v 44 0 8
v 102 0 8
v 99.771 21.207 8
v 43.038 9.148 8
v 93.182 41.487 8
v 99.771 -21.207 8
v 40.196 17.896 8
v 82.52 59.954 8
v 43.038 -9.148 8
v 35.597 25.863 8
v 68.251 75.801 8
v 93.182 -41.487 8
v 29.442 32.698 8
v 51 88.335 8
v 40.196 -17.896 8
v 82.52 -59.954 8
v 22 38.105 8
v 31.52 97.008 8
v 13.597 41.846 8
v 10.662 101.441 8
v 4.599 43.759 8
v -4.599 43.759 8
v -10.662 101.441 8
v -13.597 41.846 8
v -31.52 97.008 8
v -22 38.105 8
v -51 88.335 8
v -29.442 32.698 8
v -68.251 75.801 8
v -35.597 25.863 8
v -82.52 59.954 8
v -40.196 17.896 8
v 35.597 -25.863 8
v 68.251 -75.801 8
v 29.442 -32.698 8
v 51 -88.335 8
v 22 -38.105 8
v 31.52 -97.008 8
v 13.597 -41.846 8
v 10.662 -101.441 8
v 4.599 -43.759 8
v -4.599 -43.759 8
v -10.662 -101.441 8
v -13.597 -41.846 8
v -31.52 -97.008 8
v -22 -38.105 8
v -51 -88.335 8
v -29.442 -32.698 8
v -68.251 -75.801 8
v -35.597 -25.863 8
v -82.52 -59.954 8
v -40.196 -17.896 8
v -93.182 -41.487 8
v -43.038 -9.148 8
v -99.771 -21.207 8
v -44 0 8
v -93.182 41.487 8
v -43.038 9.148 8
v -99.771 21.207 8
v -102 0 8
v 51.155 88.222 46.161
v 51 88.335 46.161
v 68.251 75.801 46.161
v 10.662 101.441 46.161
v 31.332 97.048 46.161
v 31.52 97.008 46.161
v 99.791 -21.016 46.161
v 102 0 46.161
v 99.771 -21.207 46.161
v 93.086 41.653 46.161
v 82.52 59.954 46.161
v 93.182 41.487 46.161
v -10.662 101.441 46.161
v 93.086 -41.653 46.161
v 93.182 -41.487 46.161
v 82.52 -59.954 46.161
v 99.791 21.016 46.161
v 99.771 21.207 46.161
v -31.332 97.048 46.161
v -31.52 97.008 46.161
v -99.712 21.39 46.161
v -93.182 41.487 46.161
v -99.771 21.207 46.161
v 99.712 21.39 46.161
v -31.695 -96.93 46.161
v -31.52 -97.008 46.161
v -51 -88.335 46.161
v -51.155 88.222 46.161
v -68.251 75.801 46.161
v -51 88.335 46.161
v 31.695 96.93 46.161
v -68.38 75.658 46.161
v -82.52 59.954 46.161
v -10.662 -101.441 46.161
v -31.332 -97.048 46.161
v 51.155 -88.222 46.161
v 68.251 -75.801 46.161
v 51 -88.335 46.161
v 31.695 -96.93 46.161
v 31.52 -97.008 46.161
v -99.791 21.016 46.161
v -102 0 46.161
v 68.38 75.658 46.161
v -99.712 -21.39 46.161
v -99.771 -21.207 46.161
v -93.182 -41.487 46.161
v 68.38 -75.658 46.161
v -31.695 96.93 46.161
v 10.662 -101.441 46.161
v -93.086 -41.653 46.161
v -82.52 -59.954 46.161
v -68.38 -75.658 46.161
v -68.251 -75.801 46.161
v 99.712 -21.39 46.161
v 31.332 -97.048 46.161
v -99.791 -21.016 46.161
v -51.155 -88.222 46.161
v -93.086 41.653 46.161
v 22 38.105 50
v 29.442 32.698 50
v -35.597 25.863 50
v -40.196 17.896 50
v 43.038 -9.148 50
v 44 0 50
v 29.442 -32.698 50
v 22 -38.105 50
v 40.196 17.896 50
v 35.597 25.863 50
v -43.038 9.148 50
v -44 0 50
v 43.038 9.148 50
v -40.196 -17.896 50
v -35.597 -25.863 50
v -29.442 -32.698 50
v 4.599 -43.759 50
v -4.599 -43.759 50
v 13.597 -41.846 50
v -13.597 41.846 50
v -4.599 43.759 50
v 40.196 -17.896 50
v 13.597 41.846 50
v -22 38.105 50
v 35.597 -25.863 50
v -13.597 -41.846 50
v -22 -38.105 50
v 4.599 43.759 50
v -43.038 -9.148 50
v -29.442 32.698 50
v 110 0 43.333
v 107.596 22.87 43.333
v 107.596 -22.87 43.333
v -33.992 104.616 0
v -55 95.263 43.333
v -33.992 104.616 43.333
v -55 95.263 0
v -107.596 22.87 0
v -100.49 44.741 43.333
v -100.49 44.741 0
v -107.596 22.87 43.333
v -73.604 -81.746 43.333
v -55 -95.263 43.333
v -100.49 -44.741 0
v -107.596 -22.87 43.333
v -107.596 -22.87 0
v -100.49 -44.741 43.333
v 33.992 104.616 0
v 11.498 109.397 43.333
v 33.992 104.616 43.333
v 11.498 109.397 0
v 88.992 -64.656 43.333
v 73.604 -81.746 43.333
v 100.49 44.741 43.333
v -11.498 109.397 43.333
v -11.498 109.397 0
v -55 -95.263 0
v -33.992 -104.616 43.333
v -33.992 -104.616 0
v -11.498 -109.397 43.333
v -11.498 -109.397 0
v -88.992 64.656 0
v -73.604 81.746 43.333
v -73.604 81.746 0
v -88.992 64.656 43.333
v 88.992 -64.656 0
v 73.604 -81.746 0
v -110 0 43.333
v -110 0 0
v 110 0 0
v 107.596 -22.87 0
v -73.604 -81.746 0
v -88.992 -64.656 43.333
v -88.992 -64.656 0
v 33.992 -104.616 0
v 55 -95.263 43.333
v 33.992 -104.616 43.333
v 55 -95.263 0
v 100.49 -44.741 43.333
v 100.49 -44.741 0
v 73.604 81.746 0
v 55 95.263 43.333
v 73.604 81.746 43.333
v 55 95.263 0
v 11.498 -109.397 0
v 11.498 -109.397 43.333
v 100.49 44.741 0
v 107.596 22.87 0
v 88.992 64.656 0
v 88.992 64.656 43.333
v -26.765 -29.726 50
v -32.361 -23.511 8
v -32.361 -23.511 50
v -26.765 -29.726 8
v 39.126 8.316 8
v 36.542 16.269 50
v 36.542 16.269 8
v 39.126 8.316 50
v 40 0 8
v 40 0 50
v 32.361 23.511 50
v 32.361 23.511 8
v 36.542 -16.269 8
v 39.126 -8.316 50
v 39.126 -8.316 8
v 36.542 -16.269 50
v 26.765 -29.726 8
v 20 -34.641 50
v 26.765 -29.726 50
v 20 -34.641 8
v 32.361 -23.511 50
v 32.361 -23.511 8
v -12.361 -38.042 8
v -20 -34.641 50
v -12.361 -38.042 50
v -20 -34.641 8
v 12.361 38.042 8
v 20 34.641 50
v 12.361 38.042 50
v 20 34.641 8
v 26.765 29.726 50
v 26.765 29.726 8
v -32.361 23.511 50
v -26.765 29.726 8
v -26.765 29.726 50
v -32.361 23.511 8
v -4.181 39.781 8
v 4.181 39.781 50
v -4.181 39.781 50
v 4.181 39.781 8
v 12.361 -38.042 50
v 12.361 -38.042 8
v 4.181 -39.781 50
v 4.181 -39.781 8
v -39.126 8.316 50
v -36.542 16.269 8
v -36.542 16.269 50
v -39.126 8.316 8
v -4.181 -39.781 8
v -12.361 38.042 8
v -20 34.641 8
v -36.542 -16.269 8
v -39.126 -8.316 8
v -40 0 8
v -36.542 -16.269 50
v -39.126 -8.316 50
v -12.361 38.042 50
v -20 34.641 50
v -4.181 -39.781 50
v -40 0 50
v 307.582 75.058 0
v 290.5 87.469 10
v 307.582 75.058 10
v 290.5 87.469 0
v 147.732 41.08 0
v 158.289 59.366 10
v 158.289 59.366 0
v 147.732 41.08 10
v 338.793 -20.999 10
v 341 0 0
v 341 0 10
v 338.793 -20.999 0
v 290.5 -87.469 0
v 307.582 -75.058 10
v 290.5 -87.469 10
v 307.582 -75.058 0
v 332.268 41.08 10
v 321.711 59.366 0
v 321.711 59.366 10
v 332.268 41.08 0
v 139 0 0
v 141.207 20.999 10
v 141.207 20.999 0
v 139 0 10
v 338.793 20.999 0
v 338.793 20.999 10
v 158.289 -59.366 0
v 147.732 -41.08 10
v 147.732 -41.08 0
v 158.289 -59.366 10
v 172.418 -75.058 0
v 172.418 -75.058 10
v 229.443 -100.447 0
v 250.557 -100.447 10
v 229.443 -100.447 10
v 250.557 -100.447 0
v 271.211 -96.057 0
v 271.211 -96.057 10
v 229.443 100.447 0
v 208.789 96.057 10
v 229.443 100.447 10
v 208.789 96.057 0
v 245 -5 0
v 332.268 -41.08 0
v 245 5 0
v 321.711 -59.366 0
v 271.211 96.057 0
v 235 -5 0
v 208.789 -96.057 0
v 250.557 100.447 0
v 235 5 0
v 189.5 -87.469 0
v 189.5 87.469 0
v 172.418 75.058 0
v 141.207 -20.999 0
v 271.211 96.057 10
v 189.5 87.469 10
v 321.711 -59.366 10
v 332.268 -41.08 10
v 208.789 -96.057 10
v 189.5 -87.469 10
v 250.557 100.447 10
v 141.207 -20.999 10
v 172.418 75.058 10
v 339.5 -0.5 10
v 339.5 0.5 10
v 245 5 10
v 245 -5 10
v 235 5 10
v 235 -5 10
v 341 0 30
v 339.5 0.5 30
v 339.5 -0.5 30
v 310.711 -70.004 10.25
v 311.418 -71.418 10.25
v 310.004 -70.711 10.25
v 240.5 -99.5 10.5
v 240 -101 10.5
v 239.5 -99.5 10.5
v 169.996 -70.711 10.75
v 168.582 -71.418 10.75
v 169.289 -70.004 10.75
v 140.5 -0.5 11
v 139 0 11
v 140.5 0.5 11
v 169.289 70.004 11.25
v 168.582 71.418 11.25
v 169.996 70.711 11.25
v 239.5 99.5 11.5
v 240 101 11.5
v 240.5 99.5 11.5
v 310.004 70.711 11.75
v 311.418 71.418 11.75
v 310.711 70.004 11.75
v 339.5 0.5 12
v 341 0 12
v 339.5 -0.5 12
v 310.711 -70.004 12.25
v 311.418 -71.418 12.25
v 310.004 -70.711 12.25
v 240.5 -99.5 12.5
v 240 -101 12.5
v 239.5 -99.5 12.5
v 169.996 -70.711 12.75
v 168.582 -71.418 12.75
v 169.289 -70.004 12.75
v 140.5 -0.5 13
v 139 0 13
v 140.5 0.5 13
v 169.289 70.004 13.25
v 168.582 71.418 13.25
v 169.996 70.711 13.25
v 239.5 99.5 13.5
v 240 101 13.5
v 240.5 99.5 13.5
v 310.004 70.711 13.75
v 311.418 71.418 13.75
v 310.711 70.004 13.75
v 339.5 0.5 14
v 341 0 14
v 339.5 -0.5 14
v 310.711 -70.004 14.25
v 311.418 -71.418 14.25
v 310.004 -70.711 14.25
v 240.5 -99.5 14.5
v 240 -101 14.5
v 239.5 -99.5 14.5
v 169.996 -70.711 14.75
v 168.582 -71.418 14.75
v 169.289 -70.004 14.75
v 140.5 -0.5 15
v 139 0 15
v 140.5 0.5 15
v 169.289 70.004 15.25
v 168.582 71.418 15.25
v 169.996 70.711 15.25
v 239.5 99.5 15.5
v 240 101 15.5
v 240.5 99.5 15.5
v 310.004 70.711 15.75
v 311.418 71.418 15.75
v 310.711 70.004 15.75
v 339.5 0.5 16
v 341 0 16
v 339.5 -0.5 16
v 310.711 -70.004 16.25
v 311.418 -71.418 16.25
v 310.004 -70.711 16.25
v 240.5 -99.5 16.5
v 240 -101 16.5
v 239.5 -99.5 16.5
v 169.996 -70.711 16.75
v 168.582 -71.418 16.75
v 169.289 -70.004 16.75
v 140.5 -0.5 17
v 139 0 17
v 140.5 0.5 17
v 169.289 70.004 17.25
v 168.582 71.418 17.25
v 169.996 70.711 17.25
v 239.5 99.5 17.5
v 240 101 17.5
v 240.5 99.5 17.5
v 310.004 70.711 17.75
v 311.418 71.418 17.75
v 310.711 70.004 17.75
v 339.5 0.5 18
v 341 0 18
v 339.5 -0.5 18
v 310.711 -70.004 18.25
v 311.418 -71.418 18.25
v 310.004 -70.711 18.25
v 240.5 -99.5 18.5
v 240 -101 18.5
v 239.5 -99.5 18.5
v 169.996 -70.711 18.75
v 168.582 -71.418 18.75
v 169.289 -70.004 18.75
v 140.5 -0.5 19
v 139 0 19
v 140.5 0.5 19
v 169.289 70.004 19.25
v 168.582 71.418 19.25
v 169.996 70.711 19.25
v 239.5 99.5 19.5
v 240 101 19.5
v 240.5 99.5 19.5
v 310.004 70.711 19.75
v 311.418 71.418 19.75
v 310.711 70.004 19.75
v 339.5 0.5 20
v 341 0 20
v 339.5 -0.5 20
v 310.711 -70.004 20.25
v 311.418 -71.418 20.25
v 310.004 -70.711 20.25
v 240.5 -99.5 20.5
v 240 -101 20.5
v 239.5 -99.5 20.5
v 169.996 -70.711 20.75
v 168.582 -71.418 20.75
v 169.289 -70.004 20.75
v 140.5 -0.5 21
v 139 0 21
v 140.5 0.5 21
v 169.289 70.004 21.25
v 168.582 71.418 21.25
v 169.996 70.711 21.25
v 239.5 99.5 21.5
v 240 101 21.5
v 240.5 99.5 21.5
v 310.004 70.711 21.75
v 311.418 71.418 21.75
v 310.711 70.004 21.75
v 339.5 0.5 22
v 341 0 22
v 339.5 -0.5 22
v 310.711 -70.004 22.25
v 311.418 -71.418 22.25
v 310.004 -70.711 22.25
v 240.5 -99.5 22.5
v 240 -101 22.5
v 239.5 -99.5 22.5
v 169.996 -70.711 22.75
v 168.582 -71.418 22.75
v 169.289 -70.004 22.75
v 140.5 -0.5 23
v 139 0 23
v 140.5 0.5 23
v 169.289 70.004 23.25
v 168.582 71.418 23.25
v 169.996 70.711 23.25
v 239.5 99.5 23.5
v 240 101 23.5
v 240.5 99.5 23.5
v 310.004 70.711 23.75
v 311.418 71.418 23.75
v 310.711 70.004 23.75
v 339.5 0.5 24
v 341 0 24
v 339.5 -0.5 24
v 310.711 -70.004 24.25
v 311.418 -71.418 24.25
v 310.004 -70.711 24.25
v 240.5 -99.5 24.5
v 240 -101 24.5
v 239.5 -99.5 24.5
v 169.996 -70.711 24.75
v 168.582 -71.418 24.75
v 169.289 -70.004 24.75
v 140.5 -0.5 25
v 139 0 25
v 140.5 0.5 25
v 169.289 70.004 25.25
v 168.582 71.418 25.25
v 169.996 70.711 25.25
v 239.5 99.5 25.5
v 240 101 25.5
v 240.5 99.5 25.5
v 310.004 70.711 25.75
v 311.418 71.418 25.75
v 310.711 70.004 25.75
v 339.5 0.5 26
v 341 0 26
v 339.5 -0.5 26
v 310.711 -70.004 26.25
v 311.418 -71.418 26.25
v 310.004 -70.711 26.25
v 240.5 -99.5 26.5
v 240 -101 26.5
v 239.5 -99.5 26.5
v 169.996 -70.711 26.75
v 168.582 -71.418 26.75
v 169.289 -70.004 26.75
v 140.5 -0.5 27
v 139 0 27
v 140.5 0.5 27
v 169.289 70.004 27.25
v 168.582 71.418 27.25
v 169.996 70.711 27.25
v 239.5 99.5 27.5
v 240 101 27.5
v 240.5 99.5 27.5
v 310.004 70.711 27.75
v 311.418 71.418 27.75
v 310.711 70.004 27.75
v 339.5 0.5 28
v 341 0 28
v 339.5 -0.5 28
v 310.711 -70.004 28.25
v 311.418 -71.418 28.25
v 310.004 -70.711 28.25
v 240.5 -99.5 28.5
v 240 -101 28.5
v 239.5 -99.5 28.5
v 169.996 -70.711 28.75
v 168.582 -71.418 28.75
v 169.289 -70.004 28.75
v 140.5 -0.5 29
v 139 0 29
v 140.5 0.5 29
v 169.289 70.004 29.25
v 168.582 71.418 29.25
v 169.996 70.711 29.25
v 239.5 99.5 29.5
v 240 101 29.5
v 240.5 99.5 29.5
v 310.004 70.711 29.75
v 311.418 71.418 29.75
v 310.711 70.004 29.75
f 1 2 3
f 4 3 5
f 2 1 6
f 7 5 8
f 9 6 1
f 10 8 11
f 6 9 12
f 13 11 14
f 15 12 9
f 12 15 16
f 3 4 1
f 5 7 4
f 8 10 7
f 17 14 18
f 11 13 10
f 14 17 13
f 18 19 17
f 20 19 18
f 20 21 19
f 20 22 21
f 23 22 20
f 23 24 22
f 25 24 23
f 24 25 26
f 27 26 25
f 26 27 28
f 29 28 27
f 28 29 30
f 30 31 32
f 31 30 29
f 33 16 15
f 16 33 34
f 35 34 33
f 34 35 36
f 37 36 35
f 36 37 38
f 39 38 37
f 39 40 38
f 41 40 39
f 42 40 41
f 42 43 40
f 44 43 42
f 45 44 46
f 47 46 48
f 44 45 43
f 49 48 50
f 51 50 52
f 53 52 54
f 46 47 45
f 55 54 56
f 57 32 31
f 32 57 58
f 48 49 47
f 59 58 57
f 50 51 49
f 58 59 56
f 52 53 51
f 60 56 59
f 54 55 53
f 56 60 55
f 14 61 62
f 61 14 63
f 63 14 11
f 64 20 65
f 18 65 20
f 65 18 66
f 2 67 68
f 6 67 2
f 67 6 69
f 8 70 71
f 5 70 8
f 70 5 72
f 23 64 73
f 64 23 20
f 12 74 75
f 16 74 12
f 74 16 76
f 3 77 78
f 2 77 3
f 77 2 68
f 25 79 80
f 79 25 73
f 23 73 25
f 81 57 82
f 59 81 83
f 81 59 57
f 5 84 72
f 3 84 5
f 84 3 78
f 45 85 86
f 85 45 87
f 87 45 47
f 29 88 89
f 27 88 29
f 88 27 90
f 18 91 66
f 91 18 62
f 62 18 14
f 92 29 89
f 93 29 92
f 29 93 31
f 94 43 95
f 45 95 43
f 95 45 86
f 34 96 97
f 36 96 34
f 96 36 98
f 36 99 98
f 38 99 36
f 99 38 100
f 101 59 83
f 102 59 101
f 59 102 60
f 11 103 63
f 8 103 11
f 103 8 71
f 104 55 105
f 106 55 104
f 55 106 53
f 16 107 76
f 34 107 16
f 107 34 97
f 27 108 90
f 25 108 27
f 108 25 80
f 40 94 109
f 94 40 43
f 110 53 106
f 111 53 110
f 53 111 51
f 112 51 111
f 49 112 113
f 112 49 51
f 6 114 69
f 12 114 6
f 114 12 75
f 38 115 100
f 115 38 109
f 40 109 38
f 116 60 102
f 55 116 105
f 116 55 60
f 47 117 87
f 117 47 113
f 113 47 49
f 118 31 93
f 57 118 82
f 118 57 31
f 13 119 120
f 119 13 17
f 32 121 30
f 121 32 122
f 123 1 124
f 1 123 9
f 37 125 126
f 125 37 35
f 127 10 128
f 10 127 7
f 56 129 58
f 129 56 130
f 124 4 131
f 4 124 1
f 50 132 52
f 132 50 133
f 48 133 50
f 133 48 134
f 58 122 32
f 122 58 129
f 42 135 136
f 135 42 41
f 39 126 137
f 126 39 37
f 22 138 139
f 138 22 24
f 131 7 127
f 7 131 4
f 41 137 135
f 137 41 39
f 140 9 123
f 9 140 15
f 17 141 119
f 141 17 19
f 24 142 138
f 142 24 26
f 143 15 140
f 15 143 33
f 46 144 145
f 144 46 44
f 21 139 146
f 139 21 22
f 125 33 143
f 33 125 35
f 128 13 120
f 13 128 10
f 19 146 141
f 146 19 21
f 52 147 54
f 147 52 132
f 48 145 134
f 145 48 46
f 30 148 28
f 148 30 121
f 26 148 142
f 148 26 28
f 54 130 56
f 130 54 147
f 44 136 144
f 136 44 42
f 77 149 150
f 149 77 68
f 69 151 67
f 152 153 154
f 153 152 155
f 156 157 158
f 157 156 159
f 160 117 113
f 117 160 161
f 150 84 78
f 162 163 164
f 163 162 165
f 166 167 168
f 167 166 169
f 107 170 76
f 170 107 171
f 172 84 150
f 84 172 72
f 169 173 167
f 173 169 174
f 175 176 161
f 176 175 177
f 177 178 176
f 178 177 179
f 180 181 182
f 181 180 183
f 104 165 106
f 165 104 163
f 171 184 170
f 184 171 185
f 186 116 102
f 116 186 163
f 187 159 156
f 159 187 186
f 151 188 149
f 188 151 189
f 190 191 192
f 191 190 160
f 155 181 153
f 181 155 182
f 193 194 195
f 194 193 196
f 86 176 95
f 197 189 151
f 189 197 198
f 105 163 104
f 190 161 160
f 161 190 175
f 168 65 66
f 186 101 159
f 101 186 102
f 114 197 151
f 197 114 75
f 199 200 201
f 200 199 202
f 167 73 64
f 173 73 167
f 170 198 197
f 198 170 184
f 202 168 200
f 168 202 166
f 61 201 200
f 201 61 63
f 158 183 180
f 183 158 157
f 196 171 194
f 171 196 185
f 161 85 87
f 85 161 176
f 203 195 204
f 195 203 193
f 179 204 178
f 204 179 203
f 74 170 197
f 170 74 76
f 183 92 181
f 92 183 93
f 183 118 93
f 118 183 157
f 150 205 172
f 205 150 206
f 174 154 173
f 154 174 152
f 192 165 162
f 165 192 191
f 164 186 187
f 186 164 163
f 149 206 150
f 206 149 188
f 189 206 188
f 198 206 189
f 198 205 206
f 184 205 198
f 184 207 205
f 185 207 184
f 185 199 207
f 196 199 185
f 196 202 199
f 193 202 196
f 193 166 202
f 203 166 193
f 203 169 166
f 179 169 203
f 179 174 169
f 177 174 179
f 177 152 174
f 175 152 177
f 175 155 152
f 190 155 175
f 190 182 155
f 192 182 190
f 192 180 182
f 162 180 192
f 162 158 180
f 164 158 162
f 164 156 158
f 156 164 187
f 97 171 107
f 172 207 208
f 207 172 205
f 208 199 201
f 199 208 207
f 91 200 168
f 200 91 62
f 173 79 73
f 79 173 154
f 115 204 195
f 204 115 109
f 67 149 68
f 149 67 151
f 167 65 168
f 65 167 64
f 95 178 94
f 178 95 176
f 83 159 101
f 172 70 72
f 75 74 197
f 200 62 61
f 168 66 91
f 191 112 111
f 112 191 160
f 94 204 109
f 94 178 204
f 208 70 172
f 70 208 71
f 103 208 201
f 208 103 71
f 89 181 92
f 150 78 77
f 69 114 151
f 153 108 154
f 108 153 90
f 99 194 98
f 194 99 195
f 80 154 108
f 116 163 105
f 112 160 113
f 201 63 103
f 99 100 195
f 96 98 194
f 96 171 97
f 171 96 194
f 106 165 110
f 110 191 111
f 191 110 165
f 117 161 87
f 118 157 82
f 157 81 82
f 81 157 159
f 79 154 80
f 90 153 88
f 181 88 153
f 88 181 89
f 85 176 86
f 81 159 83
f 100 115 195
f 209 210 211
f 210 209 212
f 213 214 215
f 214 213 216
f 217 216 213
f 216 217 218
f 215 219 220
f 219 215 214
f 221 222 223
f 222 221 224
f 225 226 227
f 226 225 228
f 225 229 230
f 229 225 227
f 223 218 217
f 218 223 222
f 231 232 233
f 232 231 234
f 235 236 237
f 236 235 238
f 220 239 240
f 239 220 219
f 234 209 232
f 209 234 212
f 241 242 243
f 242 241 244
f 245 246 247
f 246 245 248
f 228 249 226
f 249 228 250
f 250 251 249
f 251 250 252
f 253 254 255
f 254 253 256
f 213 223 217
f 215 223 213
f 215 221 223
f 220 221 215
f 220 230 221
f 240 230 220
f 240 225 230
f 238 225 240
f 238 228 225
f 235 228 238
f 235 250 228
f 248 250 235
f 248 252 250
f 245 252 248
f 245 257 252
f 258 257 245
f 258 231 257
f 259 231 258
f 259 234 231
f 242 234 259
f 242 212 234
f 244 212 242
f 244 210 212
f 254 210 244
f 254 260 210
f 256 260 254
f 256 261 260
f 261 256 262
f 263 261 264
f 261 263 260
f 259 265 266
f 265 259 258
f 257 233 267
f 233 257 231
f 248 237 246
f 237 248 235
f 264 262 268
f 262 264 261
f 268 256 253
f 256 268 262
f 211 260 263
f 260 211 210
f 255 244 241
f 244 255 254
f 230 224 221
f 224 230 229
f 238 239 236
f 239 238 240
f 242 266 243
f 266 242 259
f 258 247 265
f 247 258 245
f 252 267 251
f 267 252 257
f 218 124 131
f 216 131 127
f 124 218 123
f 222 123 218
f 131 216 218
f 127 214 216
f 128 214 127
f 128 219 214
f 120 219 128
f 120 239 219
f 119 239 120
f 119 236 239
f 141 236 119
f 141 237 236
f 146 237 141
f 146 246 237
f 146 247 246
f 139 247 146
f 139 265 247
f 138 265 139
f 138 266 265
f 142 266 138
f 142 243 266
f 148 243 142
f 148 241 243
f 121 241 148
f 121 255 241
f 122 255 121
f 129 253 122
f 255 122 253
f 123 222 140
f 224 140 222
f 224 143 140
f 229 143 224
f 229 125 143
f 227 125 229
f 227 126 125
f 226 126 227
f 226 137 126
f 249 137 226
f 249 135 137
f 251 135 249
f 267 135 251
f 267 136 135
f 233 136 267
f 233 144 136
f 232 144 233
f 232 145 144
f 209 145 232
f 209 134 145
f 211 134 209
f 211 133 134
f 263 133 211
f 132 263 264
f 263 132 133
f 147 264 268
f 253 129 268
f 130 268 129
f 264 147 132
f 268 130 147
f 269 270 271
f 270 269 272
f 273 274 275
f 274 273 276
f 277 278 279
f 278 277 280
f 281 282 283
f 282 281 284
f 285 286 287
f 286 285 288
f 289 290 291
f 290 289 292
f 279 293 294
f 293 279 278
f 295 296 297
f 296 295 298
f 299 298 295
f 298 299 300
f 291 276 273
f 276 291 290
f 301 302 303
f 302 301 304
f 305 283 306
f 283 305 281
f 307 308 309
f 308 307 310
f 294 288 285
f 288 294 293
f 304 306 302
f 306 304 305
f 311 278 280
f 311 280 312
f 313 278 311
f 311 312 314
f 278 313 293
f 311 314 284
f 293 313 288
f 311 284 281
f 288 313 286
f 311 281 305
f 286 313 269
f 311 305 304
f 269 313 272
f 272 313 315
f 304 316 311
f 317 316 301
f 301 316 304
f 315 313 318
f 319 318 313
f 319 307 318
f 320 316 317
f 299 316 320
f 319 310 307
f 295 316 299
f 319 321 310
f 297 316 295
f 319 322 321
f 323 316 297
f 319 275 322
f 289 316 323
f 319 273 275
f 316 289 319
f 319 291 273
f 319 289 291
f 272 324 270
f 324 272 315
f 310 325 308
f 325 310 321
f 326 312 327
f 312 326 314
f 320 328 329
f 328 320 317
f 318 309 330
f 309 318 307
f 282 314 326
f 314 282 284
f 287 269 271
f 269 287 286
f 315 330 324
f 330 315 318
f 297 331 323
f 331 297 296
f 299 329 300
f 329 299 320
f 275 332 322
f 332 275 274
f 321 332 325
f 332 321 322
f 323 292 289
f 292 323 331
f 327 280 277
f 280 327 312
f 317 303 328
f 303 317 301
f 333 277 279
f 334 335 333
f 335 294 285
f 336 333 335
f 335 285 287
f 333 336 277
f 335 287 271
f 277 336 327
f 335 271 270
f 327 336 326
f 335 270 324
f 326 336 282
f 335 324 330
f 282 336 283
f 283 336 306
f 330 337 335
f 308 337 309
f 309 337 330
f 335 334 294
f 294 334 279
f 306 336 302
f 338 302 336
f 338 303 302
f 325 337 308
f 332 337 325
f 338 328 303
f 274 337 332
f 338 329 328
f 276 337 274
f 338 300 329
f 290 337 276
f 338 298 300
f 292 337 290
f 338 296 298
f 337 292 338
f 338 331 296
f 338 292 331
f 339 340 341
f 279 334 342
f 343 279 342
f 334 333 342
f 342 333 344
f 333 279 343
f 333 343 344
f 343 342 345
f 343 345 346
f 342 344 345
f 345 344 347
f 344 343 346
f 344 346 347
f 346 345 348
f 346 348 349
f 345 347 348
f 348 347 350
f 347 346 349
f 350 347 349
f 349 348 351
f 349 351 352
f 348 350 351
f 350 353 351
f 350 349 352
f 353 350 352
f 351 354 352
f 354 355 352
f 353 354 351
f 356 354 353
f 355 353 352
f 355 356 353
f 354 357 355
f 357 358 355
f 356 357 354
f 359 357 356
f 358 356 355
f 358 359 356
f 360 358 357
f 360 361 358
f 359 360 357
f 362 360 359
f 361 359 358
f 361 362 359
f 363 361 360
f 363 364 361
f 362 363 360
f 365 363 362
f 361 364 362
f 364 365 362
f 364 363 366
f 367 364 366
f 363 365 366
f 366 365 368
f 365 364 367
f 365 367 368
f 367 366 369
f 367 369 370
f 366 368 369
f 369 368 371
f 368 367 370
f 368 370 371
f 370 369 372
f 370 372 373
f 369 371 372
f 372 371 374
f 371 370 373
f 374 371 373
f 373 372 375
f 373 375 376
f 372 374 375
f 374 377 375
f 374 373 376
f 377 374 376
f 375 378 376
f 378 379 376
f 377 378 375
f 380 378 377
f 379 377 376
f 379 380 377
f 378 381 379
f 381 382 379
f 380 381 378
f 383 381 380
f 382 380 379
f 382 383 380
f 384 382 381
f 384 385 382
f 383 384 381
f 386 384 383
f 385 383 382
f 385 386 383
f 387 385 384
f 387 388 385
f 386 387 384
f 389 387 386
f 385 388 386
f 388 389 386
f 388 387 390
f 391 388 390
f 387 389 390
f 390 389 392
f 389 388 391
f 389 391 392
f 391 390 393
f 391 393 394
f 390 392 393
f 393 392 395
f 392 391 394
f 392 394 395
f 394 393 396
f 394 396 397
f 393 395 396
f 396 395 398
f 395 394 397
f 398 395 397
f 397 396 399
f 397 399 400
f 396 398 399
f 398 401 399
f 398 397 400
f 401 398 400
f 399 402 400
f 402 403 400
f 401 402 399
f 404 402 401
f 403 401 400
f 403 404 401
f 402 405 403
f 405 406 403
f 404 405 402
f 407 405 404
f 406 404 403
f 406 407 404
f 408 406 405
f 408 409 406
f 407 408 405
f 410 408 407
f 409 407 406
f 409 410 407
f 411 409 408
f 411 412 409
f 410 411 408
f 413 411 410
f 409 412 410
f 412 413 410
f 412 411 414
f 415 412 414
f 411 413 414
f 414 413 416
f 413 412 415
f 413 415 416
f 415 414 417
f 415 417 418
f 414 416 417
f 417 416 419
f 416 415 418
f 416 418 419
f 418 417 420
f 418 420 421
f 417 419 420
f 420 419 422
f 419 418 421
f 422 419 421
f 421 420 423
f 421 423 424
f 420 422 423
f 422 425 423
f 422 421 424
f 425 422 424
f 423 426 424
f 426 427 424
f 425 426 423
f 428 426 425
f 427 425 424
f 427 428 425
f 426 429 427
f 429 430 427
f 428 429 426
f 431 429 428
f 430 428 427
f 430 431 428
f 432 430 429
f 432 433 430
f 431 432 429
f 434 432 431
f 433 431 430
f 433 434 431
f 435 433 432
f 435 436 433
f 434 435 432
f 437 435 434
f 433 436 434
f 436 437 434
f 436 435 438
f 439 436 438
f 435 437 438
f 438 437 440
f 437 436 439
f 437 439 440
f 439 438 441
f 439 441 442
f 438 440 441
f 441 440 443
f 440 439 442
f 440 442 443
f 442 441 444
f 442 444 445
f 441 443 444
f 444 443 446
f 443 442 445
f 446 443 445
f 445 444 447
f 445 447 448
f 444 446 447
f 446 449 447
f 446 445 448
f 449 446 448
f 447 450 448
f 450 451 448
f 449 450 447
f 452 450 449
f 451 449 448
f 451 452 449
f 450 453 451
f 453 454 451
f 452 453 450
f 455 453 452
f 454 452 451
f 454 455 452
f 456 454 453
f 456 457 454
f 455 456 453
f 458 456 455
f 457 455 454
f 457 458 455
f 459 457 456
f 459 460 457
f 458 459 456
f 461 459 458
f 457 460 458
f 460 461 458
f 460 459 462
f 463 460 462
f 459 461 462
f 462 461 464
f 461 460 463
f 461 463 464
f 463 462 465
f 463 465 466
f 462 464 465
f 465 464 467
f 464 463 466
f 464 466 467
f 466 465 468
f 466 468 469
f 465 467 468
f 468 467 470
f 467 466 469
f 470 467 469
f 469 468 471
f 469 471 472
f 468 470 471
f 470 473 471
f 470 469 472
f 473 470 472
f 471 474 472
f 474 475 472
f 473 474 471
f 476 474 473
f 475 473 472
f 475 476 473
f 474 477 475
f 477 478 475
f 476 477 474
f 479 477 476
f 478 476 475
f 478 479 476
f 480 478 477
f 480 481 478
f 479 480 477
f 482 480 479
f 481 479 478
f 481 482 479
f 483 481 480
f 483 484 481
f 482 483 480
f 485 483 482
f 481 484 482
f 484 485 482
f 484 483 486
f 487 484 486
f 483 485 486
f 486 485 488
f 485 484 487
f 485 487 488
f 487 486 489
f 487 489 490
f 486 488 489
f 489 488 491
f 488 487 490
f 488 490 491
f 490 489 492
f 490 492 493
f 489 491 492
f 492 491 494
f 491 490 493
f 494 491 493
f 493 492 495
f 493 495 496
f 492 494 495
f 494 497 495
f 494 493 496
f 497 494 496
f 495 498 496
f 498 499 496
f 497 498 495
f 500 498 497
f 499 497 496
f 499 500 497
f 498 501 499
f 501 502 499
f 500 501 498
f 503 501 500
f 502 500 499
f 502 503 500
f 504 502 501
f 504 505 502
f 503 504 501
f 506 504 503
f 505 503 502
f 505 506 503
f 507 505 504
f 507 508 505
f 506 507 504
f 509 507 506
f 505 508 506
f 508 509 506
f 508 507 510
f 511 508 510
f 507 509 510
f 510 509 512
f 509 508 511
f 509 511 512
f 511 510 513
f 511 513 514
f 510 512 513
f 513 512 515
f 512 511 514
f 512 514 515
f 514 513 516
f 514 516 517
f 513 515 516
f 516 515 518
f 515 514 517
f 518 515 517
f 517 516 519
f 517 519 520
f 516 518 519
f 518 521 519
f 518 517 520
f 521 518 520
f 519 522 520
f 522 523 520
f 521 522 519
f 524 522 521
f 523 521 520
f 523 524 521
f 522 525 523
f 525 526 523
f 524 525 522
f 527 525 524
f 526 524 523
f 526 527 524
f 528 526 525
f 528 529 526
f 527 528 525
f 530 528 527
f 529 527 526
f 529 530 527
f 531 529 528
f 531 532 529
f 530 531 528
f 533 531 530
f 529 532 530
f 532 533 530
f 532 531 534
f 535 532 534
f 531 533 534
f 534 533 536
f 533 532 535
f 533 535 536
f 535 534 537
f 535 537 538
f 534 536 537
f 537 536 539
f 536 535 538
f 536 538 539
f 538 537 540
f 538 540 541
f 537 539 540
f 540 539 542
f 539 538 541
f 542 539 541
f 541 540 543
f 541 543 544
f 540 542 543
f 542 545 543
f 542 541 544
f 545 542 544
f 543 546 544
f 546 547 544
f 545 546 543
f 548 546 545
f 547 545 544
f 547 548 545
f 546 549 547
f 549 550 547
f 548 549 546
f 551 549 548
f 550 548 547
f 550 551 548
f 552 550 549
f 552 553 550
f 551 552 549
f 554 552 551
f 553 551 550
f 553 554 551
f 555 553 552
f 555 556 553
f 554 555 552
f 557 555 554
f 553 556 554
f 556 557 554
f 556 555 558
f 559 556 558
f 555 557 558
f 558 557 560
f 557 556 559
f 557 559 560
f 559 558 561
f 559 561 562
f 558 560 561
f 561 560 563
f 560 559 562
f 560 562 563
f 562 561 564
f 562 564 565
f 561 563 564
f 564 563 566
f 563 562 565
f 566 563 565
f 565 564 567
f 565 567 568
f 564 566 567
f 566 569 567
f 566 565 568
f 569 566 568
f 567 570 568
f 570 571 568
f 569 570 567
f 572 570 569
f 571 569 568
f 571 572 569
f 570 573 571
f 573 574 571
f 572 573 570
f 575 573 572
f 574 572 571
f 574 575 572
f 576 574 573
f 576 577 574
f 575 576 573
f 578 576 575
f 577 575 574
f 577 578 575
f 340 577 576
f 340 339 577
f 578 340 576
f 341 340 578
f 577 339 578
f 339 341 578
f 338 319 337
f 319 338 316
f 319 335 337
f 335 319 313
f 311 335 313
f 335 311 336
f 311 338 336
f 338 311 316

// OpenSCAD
// Lamp Stand Design with Threaded Cover and Compartments
// Circular base with threaded top, electronics compartment, and sand chamber
// By GitHub Copilot

// Parameters
base_diameter = 220;        // Base diameter in mm
base_height = 80;           // Height of the lamp stand
wall_thickness = 8;         // Wall thickness for hollow interior
tube_hole_size = 10;        // 10x10mm square hole for aluminum tube
tube_hole_depth = 40;       // How deep the tube hole goes

// Thread parameters (metric M200x2)
thread_pitch = 2;           // Metric thread pitch
thread_depth = 1.5;         // Thread depth
thread_height = 20;         // Height of threaded section
cover_thickness = 10;       // Thickness of removable cover

// Electronics compartment
electronics_radius = 40;    // Radius of central electronics compartment
divider_thickness = 4;      // Thickness of wall between compartments

// Calculated values
base_radius = base_diameter / 2;
outer_sand_inner_radius = electronics_radius + divider_thickness;
outer_sand_outer_radius = base_radius - wall_thickness;

// Simple thread approximation module
module metric_thread_external(radius, pitch, height) {
    linear_extrude(height = height, twist = 360 * height / pitch, slices = height * 4)
        polygon([
            [radius - thread_depth, -pitch/4],
            [radius, 0],
            [radius - thread_depth, pitch/4]
        ]);
}

module metric_thread_internal(radius, pitch, height) {
    linear_extrude(height = height, twist = -360 * height / pitch, slices = height * 4)
        polygon([
            [radius, -pitch/4],
            [radius + thread_depth, 0],
            [radius, pitch/4]
        ]);
}

module lamp_stand_base() {
    difference() {
        // Main body with rounded top
        hull() {
            // Bottom cylinder (flat)
            cylinder(h = base_height - base_radius/3, r = base_radius);
            
            // Top sphere section for rounded appearance
            translate([0, 0, base_height - base_radius/3])
                sphere(r = base_radius/3);
        }
        
        // Central electronics compartment
        translate([0, 0, wall_thickness])
            cylinder(h = base_height - cover_thickness - wall_thickness, r = electronics_radius);
        
        // Outer sand compartment (ring around electronics)
        translate([0, 0, wall_thickness])
            difference() {
                cylinder(h = base_height - cover_thickness - wall_thickness, r = outer_sand_outer_radius);
                cylinder(h = base_height - cover_thickness - wall_thickness + 1, r = outer_sand_inner_radius);
            }
        
        // Threaded cavity for cover (inside the base)
        translate([0, 0, base_height - cover_thickness - thread_height])
            cylinder(h = cover_thickness + thread_height + 1, r = base_radius - wall_thickness);
        
        // Internal female threads (inside the cavity)
        translate([0, 0, base_height - cover_thickness - thread_height])
            metric_thread_internal(base_radius - wall_thickness - 1, thread_pitch, thread_height);
        
        // Square hole for 10x10mm aluminum tube - goes down from top only
        translate([0, 0, base_height - tube_hole_depth])
            linear_extrude(height = tube_hole_depth + 1)
                square([tube_hole_size, tube_hole_size], center = true);
    }
}

module lamp_stand_cover() {
    translate([base_diameter + 20, 0, 0]) {
        difference() {
            union() {
                // Cover body - sits flush with base top
                cylinder(h = cover_thickness, r = base_radius - wall_thickness - 1);
                
                // External male threads that screw into the base cavity
                translate([0, 0, cover_thickness])
                    metric_thread_external(base_radius - wall_thickness - 1, thread_pitch, thread_height);
            }
            
            // Tube hole through cover
            translate([0, 0, -1])
                linear_extrude(height = cover_thickness + thread_height + 2)
                    square([tube_hole_size, tube_hole_size], center = true);
        }
    }
}

// Render both parts
lamp_stand_base();
lamp_stand_cover();

// Optional: Show a preview of the aluminum tube
%translate([0, 0, base_height - tube_hole_depth/2])
    linear_extrude(height = tube_hole_depth + 20)
        square([tube_hole_size - 0.2, tube_hole_size - 0.2], center = true);
